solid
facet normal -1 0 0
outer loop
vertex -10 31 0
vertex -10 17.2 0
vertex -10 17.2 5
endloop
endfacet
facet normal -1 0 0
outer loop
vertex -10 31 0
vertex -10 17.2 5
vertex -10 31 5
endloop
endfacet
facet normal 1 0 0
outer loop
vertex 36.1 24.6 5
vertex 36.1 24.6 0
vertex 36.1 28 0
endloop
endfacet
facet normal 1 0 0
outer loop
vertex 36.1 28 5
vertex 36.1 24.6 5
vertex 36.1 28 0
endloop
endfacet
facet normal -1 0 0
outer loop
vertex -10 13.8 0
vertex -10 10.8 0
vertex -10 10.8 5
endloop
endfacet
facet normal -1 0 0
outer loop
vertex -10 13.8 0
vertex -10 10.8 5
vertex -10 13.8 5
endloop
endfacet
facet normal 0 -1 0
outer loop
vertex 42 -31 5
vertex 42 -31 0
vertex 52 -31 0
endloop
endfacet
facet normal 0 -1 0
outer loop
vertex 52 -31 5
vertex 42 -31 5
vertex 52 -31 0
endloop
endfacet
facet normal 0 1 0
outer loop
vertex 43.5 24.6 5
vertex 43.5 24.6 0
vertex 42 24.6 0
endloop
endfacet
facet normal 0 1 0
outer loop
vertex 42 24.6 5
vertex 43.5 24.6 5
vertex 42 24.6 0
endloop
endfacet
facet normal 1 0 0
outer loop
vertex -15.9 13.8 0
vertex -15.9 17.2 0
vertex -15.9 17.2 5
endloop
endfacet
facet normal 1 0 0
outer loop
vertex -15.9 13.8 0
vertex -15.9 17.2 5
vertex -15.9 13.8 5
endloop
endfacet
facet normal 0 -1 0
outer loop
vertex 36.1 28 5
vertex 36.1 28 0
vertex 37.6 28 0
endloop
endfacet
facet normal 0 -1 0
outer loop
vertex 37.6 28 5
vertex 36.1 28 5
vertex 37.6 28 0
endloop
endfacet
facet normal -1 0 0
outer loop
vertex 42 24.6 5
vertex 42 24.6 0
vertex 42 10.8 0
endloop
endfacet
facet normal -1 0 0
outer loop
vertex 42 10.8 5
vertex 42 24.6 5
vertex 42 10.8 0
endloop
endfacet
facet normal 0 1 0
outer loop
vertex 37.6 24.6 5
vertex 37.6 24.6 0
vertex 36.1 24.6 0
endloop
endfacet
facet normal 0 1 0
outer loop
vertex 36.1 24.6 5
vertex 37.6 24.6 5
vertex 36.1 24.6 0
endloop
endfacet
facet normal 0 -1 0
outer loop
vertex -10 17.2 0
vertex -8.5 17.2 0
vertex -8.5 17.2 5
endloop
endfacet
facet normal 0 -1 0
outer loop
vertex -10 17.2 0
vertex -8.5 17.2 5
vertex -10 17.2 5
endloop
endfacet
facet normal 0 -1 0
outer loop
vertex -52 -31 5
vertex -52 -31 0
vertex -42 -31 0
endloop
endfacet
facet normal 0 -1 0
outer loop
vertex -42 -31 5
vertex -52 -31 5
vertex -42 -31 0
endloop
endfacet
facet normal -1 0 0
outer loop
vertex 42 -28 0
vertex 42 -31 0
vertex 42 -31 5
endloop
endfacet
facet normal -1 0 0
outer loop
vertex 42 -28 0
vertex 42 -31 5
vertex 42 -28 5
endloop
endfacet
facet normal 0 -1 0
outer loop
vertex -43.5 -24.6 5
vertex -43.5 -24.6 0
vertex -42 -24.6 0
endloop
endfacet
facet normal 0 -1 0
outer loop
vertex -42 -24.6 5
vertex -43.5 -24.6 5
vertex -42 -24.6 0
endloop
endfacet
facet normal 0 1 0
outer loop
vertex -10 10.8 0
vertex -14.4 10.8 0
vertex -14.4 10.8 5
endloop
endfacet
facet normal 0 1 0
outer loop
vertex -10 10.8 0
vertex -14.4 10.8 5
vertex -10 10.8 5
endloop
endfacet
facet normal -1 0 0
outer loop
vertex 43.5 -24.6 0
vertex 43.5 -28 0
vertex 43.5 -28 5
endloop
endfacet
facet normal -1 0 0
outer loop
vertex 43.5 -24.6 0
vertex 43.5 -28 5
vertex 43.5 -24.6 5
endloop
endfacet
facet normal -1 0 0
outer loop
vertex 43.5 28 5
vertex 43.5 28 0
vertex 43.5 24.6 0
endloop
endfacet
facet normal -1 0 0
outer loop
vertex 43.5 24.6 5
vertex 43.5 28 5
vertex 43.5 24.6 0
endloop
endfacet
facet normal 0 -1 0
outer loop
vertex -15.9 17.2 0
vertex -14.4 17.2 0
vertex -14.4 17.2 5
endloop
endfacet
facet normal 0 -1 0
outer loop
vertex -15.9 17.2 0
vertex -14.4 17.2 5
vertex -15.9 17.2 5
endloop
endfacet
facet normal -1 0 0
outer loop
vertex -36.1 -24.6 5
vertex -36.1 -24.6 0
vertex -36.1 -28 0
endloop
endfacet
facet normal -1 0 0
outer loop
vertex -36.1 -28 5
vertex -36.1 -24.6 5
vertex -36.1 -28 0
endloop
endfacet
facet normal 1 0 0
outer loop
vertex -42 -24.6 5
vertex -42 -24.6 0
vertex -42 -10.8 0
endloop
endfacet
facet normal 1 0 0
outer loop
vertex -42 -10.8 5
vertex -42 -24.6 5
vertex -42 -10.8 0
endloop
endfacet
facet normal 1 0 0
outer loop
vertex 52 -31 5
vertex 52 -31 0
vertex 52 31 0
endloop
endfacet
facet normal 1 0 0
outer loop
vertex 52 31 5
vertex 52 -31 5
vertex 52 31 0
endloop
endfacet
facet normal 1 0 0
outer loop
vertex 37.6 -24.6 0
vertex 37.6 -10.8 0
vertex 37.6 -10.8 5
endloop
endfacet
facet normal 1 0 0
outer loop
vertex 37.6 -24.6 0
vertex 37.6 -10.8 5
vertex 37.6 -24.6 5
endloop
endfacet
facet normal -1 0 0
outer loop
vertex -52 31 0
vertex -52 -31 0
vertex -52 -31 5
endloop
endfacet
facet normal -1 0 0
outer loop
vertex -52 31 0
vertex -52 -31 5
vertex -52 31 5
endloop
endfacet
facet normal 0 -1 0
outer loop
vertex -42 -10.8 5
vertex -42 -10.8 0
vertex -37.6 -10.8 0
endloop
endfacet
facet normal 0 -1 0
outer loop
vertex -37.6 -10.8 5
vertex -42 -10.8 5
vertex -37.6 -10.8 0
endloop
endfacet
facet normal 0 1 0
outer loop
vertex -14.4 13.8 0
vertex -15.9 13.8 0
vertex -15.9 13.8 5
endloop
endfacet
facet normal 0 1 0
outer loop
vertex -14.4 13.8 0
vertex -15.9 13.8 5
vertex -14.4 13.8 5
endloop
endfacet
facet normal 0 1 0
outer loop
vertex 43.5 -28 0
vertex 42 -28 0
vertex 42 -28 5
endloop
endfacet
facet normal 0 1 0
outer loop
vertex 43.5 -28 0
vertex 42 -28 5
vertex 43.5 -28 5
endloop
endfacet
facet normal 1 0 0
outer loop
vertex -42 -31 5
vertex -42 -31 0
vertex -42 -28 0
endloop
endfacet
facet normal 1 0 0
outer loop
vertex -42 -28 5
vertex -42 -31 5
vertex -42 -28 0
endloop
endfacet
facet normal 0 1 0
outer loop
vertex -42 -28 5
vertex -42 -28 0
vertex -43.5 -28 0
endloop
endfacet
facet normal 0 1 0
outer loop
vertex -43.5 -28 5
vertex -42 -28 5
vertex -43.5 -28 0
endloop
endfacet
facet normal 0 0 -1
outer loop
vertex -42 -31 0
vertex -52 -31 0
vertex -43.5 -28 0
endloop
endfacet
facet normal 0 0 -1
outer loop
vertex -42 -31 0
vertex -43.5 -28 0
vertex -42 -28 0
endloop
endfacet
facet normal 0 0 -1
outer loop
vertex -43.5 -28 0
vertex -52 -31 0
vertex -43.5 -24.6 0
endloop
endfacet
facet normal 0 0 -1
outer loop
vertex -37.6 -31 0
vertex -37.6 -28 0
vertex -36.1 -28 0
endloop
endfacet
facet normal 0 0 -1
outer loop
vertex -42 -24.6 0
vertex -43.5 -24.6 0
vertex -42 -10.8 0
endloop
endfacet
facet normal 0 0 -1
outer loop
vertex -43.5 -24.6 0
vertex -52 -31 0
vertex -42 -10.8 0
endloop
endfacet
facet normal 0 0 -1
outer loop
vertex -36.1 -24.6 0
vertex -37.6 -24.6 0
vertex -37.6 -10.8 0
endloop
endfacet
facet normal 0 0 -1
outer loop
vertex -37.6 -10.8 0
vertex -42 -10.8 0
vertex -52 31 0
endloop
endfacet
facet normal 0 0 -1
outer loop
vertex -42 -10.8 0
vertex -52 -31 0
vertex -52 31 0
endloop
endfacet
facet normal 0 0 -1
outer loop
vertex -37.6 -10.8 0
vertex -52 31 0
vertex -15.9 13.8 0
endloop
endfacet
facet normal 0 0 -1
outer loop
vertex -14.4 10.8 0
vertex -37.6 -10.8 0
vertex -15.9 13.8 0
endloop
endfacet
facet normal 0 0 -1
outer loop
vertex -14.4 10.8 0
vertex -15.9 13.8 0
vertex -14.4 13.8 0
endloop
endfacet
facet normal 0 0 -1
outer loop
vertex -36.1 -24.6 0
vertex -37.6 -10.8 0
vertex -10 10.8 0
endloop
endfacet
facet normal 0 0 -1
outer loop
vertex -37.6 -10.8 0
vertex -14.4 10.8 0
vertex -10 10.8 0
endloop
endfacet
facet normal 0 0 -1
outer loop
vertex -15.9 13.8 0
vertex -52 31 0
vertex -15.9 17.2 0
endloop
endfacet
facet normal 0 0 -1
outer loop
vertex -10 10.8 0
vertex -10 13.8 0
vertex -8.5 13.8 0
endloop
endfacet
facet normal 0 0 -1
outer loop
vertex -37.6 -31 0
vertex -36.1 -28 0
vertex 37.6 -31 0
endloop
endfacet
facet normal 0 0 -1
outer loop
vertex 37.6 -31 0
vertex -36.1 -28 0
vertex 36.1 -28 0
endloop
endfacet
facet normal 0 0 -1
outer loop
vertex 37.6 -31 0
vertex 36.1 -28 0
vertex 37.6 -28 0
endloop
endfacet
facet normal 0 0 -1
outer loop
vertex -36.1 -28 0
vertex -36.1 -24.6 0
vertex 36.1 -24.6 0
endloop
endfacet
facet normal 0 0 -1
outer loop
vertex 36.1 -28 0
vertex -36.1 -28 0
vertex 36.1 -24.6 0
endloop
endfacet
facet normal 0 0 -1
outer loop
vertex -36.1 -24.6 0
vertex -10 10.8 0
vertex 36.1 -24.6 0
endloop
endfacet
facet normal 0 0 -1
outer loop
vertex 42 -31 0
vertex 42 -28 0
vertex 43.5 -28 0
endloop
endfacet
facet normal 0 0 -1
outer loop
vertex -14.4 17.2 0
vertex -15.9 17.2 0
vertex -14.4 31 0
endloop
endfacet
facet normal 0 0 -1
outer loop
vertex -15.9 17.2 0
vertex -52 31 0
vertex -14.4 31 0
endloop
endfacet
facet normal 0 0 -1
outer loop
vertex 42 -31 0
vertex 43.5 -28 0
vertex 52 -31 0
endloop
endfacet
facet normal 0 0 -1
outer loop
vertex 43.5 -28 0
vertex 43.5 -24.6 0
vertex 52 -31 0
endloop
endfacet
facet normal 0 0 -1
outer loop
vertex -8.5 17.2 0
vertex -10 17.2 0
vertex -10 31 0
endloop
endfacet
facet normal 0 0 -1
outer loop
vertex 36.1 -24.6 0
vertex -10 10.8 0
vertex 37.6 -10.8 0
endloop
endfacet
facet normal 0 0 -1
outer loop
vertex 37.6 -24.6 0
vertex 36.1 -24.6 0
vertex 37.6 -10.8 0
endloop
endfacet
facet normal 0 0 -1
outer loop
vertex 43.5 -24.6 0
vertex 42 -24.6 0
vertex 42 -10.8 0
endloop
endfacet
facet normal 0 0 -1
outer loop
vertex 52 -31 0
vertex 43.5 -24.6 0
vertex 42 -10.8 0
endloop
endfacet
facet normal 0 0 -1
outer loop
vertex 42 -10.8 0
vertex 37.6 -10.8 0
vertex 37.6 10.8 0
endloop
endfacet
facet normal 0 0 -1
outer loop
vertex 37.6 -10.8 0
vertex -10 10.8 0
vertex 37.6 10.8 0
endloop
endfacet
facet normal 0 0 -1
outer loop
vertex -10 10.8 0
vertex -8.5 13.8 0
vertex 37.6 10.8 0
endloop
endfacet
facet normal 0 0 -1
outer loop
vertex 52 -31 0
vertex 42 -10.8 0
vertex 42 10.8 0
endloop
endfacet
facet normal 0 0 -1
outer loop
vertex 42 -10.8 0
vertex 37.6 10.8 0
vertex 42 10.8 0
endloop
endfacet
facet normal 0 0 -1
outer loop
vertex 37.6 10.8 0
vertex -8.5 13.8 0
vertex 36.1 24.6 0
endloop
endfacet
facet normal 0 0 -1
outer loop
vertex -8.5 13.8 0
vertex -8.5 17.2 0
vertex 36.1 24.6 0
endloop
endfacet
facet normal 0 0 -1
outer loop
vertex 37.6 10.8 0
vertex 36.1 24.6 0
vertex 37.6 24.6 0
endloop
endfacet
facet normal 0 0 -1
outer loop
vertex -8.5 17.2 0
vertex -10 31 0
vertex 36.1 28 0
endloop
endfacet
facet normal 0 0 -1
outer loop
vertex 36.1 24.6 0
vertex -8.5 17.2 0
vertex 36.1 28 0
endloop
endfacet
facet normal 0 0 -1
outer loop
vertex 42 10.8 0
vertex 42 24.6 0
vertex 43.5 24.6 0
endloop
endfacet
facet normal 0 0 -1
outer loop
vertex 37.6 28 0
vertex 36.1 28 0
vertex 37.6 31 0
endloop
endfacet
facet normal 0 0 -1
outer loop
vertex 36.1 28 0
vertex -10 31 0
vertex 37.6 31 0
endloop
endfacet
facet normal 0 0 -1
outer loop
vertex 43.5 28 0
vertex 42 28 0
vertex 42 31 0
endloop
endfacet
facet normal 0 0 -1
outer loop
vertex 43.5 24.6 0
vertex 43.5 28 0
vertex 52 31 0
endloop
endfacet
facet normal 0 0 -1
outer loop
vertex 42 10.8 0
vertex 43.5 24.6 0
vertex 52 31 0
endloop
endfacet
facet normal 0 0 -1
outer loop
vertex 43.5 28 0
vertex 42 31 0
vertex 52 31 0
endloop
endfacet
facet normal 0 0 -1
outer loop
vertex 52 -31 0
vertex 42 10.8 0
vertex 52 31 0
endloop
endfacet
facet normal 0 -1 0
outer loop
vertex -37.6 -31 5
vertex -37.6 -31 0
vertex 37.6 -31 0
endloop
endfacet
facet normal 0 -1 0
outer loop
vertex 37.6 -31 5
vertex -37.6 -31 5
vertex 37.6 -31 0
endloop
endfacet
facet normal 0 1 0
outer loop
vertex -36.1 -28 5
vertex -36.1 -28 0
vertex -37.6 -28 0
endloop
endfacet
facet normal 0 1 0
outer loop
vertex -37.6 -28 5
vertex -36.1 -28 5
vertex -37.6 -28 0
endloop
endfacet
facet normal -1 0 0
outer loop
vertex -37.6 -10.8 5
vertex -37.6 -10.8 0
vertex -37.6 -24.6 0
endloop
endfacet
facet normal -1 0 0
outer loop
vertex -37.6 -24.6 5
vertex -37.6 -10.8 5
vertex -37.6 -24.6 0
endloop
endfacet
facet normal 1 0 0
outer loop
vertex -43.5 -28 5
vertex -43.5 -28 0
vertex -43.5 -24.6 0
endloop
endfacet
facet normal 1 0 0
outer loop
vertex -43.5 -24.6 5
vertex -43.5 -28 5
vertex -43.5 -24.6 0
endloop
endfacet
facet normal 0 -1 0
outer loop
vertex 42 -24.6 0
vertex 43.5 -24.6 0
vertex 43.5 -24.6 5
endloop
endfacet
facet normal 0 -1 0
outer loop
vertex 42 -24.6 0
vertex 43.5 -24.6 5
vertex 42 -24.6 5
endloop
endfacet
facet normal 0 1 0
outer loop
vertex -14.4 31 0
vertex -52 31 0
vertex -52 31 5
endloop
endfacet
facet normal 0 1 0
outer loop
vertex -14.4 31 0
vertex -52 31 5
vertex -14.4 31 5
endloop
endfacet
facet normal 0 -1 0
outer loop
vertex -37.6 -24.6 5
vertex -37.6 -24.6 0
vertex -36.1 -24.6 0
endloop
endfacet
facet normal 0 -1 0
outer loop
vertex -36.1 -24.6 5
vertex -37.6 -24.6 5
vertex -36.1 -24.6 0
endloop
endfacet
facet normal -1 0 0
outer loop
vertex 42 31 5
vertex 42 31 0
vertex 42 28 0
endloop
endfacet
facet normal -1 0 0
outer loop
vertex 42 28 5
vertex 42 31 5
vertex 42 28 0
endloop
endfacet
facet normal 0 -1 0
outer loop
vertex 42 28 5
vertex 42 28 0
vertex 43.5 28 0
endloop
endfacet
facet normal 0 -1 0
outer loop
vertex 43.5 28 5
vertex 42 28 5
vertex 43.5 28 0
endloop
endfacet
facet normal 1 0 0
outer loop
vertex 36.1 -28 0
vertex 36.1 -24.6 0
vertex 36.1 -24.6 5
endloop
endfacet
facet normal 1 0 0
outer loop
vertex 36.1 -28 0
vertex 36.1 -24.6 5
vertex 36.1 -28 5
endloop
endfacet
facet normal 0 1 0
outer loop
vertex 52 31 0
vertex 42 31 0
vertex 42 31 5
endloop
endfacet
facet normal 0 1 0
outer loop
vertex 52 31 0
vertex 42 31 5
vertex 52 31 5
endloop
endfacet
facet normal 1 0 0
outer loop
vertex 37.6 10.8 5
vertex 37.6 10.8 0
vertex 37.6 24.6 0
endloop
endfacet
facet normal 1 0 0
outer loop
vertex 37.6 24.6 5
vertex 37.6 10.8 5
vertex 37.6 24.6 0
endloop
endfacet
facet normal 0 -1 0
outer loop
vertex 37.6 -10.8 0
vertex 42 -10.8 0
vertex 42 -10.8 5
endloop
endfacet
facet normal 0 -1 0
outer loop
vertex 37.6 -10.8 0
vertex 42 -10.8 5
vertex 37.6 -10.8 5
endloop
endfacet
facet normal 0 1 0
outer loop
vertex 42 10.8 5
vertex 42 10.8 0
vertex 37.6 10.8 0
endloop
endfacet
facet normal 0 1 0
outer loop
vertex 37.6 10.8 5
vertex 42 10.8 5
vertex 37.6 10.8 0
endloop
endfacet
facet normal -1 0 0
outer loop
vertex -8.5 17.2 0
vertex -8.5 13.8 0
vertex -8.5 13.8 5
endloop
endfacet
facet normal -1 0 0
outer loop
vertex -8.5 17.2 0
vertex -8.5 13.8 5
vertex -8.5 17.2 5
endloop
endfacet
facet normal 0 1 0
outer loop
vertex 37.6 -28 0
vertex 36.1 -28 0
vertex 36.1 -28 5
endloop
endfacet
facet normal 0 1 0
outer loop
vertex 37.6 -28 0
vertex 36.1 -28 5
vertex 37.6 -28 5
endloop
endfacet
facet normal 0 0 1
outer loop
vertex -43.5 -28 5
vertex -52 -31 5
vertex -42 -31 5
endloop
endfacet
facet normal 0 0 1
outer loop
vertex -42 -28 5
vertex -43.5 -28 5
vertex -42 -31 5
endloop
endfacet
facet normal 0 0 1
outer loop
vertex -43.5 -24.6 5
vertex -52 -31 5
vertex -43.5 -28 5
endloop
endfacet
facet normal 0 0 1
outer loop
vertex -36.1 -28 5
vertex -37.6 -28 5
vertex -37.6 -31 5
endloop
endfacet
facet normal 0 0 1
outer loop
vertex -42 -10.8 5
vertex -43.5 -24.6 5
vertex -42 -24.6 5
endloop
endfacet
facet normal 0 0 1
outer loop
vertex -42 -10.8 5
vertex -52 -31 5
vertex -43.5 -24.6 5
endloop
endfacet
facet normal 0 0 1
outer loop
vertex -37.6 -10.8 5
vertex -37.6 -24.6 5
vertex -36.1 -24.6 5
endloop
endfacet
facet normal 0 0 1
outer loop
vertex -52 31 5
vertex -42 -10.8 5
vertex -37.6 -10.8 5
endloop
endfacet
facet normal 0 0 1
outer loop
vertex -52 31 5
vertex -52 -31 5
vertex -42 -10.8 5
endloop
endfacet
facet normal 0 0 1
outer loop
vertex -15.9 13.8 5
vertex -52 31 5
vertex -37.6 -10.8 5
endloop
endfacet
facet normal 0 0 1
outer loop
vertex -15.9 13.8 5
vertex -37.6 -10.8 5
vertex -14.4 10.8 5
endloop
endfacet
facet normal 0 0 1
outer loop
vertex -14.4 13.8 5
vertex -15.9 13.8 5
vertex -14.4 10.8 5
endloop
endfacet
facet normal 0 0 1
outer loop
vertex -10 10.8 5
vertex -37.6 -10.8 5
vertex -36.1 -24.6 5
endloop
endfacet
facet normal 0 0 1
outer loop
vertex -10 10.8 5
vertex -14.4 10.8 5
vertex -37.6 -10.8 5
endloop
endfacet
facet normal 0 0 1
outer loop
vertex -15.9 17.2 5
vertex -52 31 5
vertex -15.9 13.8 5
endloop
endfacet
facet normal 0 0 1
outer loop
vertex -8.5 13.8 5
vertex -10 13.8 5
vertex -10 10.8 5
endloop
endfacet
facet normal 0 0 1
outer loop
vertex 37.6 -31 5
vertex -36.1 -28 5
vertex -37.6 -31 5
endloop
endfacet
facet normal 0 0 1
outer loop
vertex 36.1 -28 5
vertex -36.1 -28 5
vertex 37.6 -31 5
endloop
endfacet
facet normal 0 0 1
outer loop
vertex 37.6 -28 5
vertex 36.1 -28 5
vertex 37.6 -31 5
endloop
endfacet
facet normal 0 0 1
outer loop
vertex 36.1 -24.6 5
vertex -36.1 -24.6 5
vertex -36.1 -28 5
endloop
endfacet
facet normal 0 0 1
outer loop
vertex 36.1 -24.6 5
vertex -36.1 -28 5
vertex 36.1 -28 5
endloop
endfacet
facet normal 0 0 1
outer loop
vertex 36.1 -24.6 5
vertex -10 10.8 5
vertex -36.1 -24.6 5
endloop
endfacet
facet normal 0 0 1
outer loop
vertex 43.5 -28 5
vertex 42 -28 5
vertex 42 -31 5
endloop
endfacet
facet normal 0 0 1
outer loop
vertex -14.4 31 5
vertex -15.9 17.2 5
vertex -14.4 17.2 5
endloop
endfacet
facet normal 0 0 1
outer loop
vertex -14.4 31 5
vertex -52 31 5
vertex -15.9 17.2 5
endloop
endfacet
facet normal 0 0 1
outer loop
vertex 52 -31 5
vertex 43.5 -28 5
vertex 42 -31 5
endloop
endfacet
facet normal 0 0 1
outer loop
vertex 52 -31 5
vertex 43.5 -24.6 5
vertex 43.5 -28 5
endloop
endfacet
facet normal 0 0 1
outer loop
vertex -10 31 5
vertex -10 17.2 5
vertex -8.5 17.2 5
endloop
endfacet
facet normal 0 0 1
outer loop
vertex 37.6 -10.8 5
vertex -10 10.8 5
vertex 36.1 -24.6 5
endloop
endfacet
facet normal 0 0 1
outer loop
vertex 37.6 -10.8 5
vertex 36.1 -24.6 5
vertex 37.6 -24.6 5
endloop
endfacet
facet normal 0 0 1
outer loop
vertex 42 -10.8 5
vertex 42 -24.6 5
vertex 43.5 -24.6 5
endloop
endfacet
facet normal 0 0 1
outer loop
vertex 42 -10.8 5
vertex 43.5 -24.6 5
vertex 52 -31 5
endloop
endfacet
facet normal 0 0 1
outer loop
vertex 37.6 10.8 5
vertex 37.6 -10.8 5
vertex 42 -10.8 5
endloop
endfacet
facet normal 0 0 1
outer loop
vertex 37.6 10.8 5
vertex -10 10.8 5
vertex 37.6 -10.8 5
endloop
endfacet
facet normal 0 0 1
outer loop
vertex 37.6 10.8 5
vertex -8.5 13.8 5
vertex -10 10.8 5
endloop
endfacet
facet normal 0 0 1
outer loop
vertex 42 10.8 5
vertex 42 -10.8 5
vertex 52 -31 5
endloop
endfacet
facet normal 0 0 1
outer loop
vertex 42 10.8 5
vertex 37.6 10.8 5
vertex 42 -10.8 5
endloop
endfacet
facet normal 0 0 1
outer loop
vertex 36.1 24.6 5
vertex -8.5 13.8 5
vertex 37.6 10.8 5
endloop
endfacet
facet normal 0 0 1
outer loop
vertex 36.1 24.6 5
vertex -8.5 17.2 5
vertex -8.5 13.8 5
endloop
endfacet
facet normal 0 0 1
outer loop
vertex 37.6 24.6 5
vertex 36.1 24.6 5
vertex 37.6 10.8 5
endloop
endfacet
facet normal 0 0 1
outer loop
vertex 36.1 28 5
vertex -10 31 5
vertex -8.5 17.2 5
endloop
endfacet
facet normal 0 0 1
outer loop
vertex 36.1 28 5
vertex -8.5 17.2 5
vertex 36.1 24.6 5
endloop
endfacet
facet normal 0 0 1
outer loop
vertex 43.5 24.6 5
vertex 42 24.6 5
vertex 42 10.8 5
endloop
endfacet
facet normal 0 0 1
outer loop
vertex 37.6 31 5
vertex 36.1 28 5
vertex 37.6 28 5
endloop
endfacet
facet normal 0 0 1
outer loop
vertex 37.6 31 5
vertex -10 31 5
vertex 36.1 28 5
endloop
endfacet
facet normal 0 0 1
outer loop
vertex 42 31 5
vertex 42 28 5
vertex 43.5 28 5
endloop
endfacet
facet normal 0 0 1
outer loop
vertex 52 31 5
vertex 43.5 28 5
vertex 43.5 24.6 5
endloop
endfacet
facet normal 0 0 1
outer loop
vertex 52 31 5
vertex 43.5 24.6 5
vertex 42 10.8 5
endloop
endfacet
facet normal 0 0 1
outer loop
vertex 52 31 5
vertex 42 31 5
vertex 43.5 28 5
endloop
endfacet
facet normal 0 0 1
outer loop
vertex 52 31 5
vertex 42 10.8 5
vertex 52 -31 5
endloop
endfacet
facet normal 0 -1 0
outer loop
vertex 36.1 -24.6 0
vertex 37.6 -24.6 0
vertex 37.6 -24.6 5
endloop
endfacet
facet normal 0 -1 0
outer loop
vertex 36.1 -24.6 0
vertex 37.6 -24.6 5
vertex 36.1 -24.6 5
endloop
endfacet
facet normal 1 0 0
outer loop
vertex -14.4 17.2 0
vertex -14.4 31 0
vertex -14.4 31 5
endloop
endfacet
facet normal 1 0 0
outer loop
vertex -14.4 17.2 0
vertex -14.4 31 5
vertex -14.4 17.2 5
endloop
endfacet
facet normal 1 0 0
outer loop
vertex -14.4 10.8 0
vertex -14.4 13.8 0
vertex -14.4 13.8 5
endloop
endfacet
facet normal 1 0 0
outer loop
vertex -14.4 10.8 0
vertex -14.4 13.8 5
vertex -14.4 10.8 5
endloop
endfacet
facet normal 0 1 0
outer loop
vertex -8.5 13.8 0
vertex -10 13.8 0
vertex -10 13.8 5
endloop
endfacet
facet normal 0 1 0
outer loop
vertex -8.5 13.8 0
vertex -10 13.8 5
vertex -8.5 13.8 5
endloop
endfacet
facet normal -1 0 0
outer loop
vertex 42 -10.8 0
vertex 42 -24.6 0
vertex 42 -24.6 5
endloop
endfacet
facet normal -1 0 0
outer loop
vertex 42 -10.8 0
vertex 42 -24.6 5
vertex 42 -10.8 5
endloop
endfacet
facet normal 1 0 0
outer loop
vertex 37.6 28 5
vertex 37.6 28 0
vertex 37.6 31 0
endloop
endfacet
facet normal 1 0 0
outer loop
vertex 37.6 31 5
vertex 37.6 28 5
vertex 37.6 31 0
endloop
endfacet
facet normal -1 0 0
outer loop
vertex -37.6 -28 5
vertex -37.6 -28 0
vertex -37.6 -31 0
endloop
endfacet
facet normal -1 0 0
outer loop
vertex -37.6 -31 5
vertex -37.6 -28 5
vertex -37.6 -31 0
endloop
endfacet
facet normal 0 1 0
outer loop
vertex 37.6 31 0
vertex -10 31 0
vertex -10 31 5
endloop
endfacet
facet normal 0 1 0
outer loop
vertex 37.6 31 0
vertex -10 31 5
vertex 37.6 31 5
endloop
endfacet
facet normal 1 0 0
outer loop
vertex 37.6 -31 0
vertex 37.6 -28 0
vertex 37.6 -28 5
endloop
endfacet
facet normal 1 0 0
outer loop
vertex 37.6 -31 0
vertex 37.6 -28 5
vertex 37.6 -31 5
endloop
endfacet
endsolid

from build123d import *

# Parameters (mm, degrees)
SKETCH1_W           = 104
SKETCH1_H           = 62
BOSS_EXTRUDE1_DEPTH = 5
CUT_EXTRUDE1_DEPTH  = 10


with BuildPart() as part:
    # Sketch1 → Boss-Extrude1 (new body)
    with BuildSketch(Plane.XY):
        Rectangle(SKETCH1_W, SKETCH1_H)
    extrude(amount=BOSS_EXTRUDE1_DEPTH)

    # Sketch2 → Cut-Extrude1 (cut)
    with BuildSketch(Plane(origin=(0, 0, 0), x_dir=(-1, 0, 0), z_dir=(0, 0, -1))):
        Polygon((-37.6, -28), (-37.6, -31), (-42, -31), (-42, -28), (-43.5, -28), (-43.5, -24.6), (-42, -24.6), (-42, -10.8), (-37.6, -10.8), (-37.6, -24.6), (-36.1, -24.6), (-36.1, -28), align=None)
        Polygon((42, -31), (42, -28), (43.5, -28), (43.5, -24.6), (42, -24.6), (42, -10.8), (37.6, -10.8), (37.6, -24.6), (36.1, -24.6), (36.1, -28), (37.6, -28), (37.6, -31), align=None)
        Polygon((-42, 31), (-42, 28), (-43.5, 28), (-43.5, 24.6), (-42, 24.6), (-42, 10.8), (-37.6, 10.8), (-37.6, 24.6), (-36.1, 24.6), (-36.1, 28), (-37.6, 28), (-37.6, 31), align=None)
        Polygon((14.4, 13.8), (14.4, 10.8), (10, 10.8), (10, 13.8), (8.5, 13.8), (8.5, 17.2), (10, 17.2), (10, 31), (14.4, 31), (14.4, 17.2), (15.9, 17.2), (15.9, 13.8), align=None)
    extrude(amount=-CUT_EXTRUDE1_DEPTH, mode=Mode.SUBTRACT)


solid = part.part
